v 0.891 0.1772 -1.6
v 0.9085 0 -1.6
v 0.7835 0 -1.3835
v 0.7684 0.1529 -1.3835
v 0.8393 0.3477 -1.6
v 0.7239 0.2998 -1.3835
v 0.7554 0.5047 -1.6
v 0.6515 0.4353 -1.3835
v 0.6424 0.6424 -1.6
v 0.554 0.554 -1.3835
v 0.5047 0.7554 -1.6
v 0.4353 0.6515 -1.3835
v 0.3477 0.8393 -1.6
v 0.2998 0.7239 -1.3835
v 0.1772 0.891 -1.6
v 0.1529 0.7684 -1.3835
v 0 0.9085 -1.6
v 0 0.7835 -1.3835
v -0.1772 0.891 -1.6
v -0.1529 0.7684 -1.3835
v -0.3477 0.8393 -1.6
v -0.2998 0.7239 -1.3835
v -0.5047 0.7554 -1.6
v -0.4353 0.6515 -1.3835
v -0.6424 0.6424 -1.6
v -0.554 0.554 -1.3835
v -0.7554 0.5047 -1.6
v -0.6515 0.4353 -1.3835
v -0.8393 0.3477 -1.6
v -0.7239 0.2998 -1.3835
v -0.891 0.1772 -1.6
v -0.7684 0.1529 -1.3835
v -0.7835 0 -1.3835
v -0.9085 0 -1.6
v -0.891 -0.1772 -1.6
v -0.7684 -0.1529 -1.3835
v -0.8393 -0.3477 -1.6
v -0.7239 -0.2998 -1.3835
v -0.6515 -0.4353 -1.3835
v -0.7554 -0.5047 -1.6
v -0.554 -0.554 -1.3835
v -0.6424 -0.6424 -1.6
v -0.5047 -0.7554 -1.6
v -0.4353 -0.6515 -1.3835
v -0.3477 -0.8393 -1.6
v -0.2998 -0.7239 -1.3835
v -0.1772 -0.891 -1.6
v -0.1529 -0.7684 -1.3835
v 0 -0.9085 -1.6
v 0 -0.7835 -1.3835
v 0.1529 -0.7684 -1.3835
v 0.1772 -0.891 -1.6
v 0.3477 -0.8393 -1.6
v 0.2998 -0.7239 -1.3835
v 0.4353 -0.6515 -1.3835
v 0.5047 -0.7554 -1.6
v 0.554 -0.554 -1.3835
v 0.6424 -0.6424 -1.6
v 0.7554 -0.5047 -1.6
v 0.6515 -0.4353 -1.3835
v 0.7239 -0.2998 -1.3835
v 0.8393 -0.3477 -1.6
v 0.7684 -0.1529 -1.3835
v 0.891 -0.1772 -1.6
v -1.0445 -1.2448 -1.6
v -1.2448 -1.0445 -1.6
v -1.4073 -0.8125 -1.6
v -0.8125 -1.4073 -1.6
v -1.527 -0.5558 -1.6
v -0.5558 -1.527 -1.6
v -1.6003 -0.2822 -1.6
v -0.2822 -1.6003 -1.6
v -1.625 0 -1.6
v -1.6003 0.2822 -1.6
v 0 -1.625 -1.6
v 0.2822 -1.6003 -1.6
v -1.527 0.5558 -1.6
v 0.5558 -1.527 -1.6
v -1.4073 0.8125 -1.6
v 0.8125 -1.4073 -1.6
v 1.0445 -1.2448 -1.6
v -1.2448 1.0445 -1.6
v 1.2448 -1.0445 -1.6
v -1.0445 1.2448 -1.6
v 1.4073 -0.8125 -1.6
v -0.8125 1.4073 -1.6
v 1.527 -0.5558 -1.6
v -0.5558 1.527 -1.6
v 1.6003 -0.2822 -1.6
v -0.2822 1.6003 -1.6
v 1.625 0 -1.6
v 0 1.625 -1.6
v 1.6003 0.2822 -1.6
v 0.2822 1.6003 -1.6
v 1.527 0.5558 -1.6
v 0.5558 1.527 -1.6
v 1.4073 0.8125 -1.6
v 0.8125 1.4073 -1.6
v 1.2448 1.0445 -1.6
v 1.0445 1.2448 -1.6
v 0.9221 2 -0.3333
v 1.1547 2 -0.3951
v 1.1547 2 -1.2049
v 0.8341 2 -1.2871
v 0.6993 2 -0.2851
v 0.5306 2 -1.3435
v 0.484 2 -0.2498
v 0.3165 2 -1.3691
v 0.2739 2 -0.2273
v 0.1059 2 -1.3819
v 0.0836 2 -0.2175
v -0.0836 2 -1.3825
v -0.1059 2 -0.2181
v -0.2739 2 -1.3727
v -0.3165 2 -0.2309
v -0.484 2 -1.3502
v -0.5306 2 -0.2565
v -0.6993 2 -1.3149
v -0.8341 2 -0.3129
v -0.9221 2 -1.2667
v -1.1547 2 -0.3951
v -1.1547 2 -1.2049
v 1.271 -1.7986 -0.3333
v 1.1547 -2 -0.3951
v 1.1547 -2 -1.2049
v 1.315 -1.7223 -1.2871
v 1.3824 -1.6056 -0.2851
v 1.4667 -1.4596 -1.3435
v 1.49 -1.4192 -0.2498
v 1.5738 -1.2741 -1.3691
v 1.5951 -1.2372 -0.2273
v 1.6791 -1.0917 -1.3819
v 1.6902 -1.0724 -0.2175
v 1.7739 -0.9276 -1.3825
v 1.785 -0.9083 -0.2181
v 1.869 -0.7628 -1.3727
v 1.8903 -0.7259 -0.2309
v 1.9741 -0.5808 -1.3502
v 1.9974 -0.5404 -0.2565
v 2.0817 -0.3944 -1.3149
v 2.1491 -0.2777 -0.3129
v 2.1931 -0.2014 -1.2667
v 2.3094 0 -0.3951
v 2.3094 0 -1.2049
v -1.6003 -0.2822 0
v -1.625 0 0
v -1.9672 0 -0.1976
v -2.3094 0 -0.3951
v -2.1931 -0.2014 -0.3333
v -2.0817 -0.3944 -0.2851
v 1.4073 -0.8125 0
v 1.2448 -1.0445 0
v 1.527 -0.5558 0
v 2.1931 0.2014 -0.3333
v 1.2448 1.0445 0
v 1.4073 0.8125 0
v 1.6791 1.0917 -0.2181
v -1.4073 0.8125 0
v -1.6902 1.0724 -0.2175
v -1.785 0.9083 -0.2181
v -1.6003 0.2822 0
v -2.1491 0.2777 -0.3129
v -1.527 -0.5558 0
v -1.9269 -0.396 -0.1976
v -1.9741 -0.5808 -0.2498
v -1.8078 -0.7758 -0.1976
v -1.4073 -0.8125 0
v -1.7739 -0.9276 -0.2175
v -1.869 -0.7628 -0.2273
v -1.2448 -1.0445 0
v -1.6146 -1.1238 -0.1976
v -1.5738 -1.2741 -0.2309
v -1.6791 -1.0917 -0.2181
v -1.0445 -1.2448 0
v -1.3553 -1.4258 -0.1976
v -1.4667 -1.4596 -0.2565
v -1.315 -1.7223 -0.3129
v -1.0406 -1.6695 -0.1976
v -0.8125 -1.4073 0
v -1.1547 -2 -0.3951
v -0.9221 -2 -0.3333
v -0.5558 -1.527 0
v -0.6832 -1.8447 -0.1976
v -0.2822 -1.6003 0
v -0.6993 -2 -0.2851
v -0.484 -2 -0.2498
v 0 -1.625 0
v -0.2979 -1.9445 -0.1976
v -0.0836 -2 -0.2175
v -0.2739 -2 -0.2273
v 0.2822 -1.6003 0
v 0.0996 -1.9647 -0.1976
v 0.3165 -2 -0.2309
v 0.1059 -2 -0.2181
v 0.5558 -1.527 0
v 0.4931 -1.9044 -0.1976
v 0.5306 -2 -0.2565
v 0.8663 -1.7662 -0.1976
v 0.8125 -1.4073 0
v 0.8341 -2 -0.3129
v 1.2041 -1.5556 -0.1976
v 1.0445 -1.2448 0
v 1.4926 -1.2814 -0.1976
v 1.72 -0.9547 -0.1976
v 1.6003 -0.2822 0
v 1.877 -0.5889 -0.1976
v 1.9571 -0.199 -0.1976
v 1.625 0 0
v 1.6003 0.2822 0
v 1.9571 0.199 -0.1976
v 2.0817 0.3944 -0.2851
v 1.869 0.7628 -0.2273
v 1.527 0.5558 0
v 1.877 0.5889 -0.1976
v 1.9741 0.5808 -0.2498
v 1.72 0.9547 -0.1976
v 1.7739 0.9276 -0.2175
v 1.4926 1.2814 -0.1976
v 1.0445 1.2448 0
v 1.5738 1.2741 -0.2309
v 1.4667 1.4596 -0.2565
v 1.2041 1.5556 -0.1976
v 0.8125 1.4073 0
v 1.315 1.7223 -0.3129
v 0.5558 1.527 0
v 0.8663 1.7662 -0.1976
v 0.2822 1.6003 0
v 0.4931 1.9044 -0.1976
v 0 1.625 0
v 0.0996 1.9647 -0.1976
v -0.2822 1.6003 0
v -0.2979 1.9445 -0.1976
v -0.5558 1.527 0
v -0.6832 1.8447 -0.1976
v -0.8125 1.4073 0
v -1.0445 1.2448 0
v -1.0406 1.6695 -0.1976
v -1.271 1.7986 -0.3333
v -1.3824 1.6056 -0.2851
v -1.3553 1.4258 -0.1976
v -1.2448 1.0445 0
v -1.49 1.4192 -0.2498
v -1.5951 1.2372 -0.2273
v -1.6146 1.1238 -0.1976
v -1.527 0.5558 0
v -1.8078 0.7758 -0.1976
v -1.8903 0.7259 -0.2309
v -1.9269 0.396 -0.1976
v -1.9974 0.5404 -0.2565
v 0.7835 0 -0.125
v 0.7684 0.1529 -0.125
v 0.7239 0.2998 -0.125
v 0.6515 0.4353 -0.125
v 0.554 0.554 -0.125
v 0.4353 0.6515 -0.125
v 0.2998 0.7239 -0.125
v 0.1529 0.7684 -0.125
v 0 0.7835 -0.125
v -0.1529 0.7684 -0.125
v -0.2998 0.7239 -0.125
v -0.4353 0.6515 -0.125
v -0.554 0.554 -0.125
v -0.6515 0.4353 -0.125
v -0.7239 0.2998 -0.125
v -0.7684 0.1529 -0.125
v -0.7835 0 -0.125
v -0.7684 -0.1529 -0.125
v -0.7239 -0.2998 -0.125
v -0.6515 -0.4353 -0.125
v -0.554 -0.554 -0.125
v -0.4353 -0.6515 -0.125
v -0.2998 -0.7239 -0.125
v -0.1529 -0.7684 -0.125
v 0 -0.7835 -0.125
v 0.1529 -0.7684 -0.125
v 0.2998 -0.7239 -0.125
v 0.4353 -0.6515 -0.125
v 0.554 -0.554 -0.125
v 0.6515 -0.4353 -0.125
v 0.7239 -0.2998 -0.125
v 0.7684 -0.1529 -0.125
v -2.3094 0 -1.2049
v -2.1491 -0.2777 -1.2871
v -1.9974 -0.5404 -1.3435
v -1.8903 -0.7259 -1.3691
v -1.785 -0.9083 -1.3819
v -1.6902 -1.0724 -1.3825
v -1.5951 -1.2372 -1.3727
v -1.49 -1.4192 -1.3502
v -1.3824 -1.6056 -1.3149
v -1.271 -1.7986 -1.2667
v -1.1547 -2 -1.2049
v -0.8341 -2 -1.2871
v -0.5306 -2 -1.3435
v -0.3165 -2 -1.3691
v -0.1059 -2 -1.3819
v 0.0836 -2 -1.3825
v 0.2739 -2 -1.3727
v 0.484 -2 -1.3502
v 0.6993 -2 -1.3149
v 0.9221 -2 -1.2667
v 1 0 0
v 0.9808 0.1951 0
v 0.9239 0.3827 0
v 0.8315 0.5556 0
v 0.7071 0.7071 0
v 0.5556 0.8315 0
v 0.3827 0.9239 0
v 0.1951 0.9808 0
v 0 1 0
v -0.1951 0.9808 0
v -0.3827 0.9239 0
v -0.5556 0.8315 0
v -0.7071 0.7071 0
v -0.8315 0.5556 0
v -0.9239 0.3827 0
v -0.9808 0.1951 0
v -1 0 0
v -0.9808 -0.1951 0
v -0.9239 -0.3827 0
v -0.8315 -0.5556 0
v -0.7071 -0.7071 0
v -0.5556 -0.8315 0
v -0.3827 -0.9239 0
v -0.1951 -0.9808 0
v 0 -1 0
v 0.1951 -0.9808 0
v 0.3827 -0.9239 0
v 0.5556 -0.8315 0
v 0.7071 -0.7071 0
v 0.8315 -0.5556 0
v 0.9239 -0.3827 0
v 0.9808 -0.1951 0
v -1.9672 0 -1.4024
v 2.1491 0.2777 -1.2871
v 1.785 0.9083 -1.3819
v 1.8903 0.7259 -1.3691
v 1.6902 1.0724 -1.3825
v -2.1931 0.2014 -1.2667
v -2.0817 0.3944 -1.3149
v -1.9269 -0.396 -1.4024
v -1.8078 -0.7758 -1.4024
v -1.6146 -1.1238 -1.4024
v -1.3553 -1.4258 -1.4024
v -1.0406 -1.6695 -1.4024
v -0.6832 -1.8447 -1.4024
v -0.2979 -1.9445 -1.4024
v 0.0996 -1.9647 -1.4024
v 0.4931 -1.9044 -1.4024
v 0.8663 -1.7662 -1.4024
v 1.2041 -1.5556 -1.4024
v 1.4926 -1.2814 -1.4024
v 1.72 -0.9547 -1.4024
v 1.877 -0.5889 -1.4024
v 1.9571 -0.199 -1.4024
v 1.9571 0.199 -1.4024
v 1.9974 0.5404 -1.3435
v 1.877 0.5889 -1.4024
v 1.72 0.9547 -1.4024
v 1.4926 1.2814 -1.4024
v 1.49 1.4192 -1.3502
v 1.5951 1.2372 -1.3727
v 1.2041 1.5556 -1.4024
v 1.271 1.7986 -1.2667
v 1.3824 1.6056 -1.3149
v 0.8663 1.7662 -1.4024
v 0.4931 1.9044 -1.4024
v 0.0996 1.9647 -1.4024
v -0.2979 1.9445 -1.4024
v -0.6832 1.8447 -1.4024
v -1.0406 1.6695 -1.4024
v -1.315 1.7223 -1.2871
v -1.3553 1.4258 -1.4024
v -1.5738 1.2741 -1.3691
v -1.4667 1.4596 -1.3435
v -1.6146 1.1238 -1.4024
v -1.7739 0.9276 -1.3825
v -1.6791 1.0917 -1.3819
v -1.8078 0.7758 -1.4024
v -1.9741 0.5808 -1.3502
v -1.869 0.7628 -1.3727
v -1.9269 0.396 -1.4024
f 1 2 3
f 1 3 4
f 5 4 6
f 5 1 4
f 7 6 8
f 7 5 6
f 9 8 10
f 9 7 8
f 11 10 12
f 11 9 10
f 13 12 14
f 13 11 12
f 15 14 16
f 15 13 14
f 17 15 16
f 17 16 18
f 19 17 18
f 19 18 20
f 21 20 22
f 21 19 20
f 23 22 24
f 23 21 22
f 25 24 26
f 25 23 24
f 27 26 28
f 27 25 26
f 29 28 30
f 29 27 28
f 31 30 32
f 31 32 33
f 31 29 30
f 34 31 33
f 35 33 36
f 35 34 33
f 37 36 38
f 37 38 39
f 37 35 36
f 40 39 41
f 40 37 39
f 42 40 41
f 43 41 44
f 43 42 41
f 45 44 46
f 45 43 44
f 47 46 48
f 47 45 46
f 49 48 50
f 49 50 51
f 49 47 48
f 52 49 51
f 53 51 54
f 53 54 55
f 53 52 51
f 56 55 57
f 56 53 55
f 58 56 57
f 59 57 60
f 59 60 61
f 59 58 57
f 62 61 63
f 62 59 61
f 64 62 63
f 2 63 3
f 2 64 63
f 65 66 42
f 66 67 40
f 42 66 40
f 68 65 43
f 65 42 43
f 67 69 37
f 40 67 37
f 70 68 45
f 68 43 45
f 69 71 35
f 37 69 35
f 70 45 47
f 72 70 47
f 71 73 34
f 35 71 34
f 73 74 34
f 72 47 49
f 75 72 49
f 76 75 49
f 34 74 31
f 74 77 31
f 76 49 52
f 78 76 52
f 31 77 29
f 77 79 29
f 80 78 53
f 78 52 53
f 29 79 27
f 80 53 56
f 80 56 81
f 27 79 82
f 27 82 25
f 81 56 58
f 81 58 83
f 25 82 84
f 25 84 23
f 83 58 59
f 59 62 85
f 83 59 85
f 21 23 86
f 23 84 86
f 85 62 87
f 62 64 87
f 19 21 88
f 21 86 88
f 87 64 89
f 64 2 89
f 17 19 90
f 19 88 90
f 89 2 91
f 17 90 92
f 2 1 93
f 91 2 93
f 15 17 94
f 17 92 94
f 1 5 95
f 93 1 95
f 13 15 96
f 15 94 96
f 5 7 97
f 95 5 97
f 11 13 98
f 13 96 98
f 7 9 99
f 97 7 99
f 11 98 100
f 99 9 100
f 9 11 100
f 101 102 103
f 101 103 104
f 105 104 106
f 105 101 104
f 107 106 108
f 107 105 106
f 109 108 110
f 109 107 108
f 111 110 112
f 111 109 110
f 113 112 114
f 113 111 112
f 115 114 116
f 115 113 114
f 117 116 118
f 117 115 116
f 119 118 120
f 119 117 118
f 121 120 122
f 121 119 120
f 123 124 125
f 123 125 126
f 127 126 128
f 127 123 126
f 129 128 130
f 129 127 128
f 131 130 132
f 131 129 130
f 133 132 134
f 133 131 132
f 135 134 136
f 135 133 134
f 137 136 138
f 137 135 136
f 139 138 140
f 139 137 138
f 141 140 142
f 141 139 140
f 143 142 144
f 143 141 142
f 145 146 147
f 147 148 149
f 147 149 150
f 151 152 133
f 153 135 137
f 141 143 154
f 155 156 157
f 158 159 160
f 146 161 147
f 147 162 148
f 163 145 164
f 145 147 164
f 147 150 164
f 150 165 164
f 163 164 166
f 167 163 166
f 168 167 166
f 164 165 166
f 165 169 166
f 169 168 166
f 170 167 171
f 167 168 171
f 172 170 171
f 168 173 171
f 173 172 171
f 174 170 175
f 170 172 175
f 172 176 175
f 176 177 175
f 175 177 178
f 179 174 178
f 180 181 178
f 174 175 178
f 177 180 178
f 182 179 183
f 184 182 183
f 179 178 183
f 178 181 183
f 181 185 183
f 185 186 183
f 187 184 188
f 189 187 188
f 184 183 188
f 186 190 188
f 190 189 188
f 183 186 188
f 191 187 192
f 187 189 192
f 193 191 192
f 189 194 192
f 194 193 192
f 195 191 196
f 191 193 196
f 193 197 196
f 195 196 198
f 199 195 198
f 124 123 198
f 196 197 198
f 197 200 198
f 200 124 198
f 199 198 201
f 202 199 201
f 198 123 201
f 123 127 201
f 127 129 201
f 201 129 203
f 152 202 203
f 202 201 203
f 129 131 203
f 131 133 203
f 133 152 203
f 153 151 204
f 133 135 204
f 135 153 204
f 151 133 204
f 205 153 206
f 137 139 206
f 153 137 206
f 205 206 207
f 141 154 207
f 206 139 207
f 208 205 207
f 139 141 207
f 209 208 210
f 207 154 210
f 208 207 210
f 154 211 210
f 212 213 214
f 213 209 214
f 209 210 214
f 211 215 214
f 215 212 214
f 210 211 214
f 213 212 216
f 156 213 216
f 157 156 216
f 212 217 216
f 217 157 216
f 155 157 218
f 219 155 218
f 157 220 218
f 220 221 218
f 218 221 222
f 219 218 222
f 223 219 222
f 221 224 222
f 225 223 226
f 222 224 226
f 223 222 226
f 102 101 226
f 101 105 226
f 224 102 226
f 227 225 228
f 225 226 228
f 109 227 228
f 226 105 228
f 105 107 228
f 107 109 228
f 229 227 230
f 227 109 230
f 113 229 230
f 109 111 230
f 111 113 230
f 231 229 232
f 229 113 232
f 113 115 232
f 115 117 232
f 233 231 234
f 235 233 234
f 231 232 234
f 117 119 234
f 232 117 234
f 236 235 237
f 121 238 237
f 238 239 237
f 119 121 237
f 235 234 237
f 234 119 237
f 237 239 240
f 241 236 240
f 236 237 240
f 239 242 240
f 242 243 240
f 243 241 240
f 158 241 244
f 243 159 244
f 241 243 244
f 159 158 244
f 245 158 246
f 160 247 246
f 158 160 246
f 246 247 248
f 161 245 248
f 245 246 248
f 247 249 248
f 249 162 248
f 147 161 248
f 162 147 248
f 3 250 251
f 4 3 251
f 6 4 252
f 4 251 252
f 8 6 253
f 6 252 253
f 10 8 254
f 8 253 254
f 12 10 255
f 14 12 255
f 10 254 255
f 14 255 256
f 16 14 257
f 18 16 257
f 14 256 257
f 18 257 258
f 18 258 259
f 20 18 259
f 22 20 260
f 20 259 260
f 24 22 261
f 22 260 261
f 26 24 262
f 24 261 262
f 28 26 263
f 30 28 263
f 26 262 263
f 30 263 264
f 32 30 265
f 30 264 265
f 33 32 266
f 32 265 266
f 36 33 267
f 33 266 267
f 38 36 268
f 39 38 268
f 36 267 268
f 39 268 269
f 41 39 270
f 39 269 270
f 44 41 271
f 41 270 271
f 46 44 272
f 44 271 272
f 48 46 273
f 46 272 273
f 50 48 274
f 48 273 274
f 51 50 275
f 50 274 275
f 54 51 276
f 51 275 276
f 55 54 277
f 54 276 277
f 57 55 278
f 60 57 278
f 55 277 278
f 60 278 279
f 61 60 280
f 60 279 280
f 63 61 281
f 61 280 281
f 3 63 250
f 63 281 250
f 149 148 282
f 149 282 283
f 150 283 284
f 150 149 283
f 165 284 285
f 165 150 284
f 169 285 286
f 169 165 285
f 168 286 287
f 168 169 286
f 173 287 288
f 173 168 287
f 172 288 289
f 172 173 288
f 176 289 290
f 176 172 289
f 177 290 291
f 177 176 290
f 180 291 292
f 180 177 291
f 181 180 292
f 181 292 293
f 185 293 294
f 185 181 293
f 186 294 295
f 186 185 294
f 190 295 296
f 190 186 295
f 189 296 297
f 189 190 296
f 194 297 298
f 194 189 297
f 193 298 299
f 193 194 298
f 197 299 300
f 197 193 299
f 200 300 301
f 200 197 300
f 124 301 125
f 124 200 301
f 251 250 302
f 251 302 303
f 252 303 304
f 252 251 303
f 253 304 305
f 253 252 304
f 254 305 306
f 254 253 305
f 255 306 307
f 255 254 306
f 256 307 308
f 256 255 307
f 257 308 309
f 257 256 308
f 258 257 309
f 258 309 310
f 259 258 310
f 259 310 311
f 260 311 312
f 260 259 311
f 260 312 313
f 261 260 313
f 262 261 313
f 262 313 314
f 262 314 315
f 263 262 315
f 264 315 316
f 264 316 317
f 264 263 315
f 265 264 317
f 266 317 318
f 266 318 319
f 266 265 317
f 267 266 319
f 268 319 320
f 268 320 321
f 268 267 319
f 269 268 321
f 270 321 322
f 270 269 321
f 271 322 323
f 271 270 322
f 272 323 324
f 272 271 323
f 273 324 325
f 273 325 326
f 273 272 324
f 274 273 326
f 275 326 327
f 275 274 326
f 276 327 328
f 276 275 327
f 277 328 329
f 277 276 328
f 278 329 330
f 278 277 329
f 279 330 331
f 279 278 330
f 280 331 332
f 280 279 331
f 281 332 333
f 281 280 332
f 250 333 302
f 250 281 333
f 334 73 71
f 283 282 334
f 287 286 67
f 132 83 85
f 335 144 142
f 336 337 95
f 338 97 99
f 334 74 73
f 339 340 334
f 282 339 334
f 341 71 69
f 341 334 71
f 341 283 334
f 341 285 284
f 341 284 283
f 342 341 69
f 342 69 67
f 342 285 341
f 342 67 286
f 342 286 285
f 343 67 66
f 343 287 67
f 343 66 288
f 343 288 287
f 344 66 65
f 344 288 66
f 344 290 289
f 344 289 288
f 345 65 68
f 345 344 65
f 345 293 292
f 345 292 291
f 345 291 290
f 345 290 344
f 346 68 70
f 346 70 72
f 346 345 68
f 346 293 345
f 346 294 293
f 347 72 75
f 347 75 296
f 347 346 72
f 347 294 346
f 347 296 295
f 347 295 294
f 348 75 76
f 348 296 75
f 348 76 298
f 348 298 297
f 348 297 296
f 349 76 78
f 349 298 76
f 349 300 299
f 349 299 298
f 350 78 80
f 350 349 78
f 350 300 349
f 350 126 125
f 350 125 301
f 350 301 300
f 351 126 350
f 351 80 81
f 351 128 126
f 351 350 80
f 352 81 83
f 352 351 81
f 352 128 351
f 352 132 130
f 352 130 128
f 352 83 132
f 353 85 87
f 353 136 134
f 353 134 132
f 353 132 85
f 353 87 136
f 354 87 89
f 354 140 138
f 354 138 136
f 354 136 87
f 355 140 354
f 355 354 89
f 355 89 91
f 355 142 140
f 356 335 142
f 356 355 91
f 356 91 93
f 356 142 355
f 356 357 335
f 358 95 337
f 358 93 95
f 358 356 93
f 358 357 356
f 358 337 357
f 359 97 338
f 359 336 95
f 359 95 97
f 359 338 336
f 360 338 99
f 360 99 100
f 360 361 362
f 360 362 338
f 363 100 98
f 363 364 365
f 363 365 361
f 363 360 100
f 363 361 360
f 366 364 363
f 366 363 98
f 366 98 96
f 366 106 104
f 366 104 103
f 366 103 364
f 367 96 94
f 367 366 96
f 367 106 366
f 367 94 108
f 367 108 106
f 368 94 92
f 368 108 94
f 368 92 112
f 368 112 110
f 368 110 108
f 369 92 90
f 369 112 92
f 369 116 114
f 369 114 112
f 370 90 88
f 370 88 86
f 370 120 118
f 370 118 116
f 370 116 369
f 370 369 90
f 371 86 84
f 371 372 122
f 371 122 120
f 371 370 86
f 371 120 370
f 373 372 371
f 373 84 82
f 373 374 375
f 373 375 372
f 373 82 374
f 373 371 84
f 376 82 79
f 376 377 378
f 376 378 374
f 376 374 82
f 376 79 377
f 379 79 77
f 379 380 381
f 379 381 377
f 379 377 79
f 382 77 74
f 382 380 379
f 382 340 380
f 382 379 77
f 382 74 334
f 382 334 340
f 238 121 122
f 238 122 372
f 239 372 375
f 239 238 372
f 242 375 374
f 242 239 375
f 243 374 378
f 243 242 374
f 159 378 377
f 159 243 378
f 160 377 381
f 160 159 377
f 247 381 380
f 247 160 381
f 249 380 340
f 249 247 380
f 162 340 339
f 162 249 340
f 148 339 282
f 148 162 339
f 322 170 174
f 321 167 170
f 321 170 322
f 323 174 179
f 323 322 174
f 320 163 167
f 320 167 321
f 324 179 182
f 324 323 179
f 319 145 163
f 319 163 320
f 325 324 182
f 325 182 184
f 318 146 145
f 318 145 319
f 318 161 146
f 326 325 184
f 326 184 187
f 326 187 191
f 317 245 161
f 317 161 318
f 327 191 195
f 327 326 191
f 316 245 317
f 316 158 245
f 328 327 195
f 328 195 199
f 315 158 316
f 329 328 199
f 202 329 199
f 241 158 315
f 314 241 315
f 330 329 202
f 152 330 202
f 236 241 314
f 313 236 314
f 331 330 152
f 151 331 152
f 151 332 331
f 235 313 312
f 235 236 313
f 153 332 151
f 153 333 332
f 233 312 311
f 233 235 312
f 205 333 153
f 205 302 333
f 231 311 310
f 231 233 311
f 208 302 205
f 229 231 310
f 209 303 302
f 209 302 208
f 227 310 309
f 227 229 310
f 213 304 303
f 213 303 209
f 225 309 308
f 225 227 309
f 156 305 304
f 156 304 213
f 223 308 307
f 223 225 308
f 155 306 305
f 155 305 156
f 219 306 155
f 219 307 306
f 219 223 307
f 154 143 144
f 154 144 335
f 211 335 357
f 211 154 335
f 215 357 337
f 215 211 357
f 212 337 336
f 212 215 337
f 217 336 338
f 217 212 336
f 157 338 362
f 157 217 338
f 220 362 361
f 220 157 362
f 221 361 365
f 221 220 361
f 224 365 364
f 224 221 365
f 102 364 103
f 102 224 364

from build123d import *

# Parameters (mm, degrees)
SKETCH1_R               = 0.7835
BASENUT_DEPTH           = 1.6
ENDCHAMFER_SIZE         = 0.2165
ENDCHAMFER_SIZE2        = 0.124996333
ENDCHAMFER_PART_2_SIZE  = 0.2165
ENDCHAMFER_PART_2_SIZE2 = 0.124996333


with BuildPart() as part:
    # Sketch1 → BaseNut (new body)
    with BuildSketch(Plane.XY):
        Polygon((2.309401077, 0), (1.154700538, 2), (-1.154700538, 2), (-2.309401077, 0), (-1.154700538, -2), (1.154700538, -2), align=None)
        Circle(SKETCH1_R, mode=Mode.SUBTRACT)
    extrude(amount=-BASENUT_DEPTH)

    # Sketch2 → Double-Chamfer (revolve, cut)
    with BuildSketch(Plane(origin=(0, 0, 0), x_dir=(1, 0, 0), z_dir=(0, 1, 0))):
        Polygon((-2.309401077, 1.6), (-1.625, 1.6), (-2.309401077, 1.204860854), align=None)
        Polygon((-2.309401077, 0.395139146), (-2.309401077, 0), (-1.625, 0), align=None)
    revolve(axis=Axis((0, 0, -3.375940562), (0, 0, 1)), mode=Mode.SUBTRACT)

    # EndChamfer
    endchamfer_edges = [part.edges().sort_by_distance(p)[0] for p in [
        (-0.7835, 0, -1.6),
    ]]
    endchamfer_side = [part.faces().sort_by_distance(p)[0] for p in [
        (-0.7835, 0, -0.8),
    ]]
    chamfer(endchamfer_edges, length=ENDCHAMFER_SIZE, length2=ENDCHAMFER_SIZE2, reference=endchamfer_side[0])

    # EndChamfer part 2
    endchamfer_part_2_edges = [part.edges().sort_by_distance(p)[0] for p in [
        (-0.7835, 0, 0),
    ]]
    endchamfer_part_2_side = [part.faces().sort_by_distance(p)[0] for p in [
        (1.579038059, 0, 0),
    ]]
    chamfer(endchamfer_part_2_edges, length=ENDCHAMFER_PART_2_SIZE, length2=ENDCHAMFER_PART_2_SIZE2, reference=endchamfer_part_2_side[0])


solid = part.part
